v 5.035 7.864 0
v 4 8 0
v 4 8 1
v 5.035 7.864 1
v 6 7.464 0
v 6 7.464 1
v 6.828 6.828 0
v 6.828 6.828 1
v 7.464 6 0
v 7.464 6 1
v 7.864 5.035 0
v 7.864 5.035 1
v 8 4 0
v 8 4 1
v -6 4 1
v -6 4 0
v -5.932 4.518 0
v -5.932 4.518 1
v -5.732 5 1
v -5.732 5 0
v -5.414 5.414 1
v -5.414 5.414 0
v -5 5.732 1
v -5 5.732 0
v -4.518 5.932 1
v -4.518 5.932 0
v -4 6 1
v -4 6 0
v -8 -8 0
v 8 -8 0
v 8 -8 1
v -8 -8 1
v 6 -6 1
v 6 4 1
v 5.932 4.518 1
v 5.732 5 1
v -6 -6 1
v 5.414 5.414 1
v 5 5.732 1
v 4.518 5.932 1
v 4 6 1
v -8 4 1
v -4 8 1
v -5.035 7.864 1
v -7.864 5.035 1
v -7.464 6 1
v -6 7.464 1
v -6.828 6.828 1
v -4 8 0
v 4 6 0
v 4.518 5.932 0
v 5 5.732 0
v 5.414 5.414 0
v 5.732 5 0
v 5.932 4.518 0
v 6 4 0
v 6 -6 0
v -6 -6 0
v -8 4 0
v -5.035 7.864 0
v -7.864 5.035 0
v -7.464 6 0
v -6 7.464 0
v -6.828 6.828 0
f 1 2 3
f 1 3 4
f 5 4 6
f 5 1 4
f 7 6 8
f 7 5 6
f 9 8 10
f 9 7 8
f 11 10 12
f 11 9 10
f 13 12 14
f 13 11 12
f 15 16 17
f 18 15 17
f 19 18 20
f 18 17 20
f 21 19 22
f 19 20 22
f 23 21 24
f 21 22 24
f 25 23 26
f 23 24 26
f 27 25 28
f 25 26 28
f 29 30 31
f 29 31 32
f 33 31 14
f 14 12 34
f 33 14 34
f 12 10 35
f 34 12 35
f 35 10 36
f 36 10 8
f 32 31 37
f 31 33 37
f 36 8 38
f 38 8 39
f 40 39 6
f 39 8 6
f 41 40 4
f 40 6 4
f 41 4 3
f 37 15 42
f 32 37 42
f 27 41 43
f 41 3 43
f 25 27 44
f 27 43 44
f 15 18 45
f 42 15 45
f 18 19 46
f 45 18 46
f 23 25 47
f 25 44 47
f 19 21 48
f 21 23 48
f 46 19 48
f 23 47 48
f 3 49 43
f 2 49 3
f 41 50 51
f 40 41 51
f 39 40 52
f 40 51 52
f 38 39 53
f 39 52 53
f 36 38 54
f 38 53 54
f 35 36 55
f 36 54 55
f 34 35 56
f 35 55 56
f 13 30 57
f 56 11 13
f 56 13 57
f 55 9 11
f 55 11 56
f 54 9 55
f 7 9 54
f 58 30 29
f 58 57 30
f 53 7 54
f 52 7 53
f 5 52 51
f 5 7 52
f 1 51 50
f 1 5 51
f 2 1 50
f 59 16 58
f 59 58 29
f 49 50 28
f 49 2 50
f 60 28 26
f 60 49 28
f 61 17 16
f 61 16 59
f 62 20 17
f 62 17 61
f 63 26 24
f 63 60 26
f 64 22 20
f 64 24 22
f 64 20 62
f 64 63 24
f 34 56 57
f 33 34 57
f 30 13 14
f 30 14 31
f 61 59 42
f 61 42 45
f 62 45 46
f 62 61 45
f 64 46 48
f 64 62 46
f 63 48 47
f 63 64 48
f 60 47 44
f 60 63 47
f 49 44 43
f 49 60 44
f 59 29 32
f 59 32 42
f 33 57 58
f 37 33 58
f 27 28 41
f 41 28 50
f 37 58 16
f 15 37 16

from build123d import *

# Parameters (mm, degrees)
BOSS_EXTRUDE2_DEPTH = 1


with BuildPart() as part:
    # Sketch1 → Boss-Extrude2 (new body)
    with BuildSketch(Plane.XY):
        with BuildLine():
            Line((-4, 8), (4, 8))
            ThreePointArc((4, 8), (6.828427125, 6.828427125), (8, 4))
            Line((8, 4), (8, -8))
            Line((8, -8), (-8, -8))
            Line((-8, -8), (-8, 4))
            ThreePointArc((-8, 4), (-6.828427125, 6.828427125), (-4, 8))
        make_face()
        with BuildLine():
            Line((-4, 6), (4, 6))
            ThreePointArc((4, 6), (5.414213562, 5.414213562), (6, 4))
            Line((6, 4), (6, -6))
            Line((6, -6), (-6, -6))
            Line((-6, -6), (-6, 4))
            ThreePointArc((-6, 4), (-5.414213562, 5.414213562), (-4, 6))
        make_face(mode=Mode.SUBTRACT)
    extrude(amount=BOSS_EXTRUDE2_DEPTH)


solid = part.part
